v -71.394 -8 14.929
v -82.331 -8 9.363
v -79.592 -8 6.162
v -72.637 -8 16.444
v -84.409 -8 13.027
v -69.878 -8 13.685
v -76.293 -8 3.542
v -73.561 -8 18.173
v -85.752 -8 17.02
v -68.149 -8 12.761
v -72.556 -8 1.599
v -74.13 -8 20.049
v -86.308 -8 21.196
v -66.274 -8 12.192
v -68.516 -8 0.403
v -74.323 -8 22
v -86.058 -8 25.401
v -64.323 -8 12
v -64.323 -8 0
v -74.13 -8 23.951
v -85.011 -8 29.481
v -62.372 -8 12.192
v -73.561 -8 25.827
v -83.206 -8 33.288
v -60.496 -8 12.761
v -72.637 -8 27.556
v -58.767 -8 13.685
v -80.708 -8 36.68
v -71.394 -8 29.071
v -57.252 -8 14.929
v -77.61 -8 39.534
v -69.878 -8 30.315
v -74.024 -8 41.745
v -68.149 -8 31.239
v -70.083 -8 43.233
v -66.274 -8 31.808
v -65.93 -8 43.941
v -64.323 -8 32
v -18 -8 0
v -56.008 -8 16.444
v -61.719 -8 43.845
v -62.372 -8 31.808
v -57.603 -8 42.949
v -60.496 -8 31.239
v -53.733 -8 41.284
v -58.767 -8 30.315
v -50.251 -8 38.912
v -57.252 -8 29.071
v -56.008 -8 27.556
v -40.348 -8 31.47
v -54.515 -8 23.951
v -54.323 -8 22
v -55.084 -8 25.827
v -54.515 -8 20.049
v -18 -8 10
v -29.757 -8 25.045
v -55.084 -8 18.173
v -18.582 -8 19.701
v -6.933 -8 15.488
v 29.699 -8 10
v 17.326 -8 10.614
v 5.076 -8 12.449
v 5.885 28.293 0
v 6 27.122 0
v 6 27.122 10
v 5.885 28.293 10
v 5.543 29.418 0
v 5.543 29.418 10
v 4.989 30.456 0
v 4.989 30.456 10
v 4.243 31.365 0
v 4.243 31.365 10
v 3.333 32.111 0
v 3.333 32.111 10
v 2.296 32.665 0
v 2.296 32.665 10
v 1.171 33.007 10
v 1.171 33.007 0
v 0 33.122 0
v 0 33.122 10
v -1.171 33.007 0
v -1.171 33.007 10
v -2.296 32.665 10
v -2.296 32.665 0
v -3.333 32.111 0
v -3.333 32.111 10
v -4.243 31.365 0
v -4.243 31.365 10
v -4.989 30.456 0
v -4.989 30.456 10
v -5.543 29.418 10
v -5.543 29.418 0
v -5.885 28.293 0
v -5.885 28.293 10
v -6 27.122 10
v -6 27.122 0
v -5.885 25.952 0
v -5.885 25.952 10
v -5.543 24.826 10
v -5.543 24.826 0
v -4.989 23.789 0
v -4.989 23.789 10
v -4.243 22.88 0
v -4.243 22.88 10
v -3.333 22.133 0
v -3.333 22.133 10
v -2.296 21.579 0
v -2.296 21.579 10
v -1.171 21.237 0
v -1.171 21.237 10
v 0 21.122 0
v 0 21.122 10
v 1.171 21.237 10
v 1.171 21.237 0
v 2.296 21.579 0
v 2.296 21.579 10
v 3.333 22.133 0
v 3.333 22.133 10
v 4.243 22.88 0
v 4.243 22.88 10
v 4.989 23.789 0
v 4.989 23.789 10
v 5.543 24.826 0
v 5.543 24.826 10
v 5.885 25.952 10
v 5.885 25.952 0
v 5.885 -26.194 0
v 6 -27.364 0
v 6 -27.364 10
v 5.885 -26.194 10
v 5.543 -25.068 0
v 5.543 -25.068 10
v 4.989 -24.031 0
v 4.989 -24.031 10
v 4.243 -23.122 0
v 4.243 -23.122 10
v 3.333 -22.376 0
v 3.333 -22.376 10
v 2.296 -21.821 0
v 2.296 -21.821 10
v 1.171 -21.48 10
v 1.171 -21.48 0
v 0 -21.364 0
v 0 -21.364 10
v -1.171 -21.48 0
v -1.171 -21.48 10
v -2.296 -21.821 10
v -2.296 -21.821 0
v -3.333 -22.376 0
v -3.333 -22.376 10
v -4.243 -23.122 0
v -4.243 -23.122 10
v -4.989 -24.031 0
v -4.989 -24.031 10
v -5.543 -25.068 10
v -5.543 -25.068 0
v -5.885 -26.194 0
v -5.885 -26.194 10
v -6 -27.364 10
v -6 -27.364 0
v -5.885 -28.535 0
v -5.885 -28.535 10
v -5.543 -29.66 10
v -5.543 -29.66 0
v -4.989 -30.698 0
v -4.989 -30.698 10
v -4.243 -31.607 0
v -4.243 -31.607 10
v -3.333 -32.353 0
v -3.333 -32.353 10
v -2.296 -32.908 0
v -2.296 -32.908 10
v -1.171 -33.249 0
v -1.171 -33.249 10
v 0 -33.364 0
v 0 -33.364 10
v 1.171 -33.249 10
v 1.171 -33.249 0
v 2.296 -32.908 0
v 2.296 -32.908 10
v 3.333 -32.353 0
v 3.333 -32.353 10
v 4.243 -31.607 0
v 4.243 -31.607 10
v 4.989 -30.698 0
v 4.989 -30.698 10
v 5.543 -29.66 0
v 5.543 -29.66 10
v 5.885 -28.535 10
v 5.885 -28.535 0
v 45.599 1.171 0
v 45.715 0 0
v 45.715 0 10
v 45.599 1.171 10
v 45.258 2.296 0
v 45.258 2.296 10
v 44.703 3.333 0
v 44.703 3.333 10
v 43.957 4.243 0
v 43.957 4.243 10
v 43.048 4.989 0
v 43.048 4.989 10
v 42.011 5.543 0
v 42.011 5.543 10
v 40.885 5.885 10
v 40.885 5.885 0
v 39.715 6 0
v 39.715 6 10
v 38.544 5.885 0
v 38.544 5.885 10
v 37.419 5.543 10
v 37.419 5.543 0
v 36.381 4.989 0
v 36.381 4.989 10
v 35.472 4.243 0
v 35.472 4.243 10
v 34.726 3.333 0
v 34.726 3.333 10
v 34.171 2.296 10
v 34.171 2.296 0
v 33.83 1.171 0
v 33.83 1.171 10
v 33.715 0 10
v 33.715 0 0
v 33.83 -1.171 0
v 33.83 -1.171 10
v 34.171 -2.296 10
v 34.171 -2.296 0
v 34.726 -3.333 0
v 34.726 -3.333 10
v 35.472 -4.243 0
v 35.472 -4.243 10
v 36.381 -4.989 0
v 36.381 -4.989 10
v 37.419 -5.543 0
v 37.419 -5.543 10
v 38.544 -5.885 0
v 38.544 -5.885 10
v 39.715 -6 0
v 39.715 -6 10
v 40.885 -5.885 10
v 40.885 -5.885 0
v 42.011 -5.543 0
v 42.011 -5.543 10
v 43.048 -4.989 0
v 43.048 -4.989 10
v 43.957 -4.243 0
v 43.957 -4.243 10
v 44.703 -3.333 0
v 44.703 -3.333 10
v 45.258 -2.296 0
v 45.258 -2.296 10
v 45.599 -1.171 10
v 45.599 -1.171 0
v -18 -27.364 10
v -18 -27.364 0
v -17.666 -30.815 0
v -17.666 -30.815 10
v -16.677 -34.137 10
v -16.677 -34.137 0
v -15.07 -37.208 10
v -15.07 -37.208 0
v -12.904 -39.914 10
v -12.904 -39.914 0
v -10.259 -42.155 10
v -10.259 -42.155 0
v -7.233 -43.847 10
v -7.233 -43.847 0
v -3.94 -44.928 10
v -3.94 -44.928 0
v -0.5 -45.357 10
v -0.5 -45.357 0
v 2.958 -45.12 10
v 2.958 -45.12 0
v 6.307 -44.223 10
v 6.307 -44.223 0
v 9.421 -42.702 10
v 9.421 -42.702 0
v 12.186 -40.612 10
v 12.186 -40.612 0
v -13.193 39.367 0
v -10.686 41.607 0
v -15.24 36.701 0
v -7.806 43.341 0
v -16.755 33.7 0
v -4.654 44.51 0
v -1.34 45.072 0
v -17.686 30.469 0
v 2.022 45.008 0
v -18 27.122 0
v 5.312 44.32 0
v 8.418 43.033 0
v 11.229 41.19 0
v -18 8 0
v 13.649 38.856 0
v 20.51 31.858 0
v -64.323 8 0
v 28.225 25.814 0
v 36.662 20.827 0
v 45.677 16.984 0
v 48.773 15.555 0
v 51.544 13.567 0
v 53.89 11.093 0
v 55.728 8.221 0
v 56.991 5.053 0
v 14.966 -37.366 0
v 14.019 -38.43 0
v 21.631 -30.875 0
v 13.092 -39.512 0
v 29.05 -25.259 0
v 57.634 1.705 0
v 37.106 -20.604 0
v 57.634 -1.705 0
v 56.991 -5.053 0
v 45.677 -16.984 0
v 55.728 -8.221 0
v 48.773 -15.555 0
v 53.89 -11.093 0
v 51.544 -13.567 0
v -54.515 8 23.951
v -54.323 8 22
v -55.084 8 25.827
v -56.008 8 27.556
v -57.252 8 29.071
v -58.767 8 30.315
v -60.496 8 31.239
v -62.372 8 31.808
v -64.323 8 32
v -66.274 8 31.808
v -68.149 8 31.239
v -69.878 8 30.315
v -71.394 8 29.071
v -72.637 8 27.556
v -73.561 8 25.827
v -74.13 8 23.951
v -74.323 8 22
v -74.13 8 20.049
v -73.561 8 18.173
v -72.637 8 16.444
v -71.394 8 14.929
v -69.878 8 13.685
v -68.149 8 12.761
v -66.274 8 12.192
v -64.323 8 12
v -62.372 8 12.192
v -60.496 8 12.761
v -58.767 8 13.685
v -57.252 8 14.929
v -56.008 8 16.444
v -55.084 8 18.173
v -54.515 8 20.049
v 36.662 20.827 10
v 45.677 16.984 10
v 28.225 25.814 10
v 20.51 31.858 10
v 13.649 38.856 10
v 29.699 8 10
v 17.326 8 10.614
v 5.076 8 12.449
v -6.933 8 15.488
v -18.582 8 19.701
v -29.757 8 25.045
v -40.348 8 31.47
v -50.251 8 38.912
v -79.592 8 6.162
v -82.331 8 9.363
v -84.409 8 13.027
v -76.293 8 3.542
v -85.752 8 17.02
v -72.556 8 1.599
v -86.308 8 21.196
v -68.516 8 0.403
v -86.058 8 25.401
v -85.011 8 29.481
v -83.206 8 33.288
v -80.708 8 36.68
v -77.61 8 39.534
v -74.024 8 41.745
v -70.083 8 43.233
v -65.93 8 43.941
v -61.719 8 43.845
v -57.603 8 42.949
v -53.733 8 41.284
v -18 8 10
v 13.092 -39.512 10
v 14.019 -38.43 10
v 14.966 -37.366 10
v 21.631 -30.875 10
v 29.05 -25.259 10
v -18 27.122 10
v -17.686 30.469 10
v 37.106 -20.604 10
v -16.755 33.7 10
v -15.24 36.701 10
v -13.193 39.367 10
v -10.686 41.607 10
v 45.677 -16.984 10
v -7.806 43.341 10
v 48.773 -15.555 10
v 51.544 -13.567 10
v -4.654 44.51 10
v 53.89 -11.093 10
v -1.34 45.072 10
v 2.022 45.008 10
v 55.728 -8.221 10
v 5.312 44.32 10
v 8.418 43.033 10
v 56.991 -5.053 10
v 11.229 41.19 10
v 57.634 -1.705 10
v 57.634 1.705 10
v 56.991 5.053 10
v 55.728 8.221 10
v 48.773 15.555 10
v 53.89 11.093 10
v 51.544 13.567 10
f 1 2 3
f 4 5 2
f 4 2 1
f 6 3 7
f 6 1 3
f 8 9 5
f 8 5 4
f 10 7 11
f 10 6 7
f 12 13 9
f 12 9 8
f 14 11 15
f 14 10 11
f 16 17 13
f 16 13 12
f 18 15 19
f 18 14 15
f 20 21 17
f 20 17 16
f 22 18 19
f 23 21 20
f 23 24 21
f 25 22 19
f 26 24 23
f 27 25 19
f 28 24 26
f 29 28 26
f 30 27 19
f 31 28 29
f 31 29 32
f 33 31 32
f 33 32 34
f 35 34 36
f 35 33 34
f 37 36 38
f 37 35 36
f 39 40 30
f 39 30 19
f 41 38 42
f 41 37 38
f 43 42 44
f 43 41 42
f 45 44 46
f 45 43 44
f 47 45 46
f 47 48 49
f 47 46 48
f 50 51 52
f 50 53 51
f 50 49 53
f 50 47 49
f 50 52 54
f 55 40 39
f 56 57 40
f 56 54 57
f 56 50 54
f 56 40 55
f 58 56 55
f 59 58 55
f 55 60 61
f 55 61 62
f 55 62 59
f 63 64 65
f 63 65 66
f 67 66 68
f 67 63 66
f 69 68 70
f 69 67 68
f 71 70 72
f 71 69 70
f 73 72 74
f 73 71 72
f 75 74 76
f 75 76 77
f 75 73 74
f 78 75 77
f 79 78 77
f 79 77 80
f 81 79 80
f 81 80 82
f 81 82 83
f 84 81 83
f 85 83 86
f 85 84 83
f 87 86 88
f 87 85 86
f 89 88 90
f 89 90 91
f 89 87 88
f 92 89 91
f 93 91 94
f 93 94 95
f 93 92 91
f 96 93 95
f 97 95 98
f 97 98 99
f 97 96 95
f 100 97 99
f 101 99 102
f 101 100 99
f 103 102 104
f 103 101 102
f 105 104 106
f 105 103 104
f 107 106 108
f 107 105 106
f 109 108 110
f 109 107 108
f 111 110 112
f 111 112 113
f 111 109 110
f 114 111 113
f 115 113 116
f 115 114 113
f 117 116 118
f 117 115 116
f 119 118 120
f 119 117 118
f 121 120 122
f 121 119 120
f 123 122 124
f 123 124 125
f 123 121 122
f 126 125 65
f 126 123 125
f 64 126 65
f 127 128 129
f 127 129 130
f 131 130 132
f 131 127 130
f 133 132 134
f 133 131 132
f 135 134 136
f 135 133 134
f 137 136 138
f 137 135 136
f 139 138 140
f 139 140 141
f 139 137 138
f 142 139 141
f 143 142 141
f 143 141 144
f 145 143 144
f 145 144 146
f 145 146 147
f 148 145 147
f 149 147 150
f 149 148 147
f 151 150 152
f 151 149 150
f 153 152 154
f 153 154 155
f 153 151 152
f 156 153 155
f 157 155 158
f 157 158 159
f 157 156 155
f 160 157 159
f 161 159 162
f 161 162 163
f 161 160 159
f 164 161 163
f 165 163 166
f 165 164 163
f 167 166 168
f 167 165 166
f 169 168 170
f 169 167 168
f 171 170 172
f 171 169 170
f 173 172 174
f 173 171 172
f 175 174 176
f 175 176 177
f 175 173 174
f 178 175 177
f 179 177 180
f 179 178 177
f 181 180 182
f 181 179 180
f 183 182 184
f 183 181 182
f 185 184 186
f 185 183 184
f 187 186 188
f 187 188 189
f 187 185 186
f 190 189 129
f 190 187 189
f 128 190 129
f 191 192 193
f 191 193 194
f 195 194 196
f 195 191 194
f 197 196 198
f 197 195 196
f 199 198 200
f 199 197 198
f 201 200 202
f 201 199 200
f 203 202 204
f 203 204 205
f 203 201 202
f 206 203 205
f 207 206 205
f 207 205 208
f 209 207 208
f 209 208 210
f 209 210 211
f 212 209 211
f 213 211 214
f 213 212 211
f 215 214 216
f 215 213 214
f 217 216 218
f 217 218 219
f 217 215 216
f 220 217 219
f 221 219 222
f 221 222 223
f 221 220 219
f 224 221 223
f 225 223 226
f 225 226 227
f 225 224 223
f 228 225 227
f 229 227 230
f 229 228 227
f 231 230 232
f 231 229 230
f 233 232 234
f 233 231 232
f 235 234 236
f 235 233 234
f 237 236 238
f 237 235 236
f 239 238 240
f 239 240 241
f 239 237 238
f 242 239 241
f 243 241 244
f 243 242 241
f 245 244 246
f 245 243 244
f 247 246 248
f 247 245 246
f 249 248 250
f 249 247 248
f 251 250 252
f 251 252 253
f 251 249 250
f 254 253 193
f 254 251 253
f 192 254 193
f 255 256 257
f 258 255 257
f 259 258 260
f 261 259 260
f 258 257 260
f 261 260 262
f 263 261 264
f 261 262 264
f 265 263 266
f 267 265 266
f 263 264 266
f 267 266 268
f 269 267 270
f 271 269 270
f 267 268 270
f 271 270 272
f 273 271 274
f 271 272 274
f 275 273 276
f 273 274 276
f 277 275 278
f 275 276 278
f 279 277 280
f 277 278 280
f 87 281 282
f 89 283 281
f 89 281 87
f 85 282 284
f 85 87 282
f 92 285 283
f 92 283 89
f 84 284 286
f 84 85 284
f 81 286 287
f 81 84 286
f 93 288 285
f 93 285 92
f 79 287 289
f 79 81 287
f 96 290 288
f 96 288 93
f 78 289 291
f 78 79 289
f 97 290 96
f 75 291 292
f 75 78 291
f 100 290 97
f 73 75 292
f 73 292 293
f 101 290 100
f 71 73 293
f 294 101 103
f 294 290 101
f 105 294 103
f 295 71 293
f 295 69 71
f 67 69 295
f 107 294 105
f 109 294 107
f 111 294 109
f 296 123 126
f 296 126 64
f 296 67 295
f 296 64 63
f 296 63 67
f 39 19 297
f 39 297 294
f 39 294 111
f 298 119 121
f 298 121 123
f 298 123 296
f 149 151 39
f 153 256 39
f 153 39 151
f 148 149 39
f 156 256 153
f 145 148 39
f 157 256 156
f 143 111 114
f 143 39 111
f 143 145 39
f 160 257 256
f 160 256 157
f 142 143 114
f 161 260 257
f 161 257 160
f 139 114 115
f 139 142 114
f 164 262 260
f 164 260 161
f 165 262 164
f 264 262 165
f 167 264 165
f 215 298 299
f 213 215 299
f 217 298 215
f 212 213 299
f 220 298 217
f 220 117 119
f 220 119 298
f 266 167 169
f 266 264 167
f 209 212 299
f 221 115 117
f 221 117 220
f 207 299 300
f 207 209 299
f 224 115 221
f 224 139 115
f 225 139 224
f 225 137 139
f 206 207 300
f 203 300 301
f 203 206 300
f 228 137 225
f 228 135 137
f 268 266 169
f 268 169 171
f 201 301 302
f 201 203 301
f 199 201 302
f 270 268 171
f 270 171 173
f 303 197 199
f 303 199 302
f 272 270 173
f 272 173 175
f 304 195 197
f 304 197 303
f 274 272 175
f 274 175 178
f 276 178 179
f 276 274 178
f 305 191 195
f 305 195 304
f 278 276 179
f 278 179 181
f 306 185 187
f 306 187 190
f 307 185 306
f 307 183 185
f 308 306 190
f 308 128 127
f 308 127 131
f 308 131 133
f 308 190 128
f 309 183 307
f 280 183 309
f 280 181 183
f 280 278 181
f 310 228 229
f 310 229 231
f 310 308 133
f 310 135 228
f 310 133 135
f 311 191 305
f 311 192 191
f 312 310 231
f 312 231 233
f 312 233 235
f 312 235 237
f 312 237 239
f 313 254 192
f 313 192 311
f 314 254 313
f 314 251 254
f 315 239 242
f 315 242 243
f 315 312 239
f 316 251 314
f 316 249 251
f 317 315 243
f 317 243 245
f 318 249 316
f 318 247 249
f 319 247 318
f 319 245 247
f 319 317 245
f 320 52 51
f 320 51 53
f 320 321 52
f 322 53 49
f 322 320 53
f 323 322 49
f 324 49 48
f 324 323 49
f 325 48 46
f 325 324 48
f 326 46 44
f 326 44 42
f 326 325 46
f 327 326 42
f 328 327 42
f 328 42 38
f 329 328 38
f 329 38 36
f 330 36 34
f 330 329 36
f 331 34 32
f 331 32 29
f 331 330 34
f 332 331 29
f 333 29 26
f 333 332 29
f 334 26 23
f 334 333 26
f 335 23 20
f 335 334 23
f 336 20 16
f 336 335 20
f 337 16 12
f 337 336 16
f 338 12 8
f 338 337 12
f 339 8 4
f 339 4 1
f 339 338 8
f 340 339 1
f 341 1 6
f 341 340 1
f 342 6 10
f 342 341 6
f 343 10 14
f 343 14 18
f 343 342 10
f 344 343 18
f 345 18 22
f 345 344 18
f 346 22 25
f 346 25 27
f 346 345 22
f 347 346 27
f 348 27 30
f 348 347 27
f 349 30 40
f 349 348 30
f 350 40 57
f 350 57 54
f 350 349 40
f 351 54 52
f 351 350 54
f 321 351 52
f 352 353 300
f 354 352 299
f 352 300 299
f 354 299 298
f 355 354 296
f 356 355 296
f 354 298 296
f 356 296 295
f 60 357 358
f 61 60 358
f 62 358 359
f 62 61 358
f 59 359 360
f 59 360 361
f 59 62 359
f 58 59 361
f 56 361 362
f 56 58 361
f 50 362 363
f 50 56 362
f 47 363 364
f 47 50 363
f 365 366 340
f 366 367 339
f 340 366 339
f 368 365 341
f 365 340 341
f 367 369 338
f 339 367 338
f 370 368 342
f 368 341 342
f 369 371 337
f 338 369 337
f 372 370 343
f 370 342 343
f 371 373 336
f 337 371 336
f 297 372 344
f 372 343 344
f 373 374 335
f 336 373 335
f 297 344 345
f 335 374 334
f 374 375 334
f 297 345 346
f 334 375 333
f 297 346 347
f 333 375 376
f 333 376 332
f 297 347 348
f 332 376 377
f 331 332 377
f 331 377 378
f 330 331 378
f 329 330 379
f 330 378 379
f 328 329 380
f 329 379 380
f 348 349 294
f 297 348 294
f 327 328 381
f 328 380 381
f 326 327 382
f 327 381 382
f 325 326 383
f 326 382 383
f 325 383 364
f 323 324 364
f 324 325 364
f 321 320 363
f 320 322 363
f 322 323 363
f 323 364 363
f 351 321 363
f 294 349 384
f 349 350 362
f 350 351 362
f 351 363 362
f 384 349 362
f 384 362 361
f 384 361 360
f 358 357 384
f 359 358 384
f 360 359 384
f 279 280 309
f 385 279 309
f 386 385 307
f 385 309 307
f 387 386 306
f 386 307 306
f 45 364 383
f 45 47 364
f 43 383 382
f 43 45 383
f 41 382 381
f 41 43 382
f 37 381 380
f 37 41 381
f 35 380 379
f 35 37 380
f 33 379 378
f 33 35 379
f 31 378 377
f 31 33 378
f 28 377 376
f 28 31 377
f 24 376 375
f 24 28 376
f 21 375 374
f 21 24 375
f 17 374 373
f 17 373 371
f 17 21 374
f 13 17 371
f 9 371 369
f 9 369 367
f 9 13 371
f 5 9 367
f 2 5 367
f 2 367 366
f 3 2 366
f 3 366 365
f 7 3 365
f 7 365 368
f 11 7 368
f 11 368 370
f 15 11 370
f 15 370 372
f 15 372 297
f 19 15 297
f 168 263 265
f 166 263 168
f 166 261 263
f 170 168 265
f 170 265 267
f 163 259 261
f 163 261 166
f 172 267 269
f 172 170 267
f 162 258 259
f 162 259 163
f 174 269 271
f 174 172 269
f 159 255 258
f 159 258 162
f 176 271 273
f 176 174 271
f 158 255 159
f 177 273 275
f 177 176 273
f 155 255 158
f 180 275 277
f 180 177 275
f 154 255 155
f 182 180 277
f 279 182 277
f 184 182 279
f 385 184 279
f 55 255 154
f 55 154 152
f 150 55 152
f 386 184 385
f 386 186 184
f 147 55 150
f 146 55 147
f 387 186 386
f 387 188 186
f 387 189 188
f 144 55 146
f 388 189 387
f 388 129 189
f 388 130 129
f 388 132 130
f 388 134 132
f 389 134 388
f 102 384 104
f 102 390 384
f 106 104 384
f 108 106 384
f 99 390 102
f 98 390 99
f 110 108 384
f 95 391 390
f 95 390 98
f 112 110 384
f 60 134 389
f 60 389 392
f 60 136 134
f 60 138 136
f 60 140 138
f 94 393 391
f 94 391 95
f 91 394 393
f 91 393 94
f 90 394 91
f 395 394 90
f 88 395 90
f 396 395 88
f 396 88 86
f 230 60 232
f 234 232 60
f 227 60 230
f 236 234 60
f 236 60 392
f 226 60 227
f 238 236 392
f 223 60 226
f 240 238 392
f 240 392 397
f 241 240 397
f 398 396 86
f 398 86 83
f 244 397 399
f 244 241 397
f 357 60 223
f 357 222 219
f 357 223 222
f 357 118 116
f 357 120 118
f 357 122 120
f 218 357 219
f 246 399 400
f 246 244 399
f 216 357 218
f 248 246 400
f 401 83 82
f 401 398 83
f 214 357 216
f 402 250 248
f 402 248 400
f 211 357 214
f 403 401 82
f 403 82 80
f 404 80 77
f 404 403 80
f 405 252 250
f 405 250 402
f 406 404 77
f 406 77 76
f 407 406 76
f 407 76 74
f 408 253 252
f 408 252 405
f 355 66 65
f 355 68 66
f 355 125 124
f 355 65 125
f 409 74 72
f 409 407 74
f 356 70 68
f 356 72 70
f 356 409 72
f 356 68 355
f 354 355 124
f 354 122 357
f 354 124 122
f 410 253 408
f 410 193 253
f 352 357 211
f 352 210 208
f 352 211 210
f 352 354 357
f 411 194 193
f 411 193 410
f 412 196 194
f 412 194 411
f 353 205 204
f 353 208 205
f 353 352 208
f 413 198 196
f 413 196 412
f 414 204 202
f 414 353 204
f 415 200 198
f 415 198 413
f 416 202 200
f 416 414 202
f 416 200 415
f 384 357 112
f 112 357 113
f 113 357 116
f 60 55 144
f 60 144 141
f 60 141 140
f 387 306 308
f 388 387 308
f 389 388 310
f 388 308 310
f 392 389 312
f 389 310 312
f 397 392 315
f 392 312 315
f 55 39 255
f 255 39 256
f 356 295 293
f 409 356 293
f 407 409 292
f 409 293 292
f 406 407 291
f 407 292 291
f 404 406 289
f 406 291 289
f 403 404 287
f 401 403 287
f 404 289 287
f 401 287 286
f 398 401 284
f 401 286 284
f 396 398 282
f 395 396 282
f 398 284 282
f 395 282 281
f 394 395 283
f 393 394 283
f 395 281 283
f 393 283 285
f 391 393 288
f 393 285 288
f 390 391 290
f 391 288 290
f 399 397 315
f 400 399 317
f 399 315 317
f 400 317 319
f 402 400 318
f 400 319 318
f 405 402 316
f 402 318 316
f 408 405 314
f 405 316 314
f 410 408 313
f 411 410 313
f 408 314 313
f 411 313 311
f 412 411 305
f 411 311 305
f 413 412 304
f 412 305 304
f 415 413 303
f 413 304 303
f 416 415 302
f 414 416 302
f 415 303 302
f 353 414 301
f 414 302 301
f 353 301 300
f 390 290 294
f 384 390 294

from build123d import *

# Parameters (mm, degrees)
F0_R     = 6
F1_DEPTH = 10
F2_R     = 10
F3_DEPTH = 8


with BuildPart() as f1:
    # F0 (on Top) → F1 (new body)
    with BuildSketch(Plane.XY):
        with BuildLine():
            ThreePointArc((45.67737, 16.983681), (28.225108, 25.813944), (13.649464, 38.856397))
            ThreePointArc((13.649464, 38.856397), (-6.257381, 43.999525), (-18, 27.122168))
            Line((-18, 27.122168), (-18, -27.364329))
            ThreePointArc((-18, -27.364329), (-7.233419, -43.846975), (12.186406, -40.61165))
            ThreePointArc((12.186406, -40.61165), (13.552871, -38.96898), (14.965577, -37.365903))
            ThreePointArc((14.965577, -37.365903), (29.049835, -25.258696), (45.67737, -16.983681))
            ThreePointArc((45.67737, -16.983681), (57.714603, 0), (45.67737, 16.983681))
        make_face()
        with Locations((0, -27.364329)):
            Circle(F0_R, mode=Mode.SUBTRACT)
        with Locations((0, 27.122168)):
            Circle(F0_R, mode=Mode.SUBTRACT)
        with Locations((39.714603, 0)):
            Circle(F0_R, mode=Mode.SUBTRACT)
    extrude(amount=F1_DEPTH)

    # F2 (on Front) → F3 (join, symmetric)
    with BuildSketch(Plane.XZ):
        with BuildLine():
            Line((-64.32263, 0), (0, 0))
            Line((0, 0), (29.698644, 0))
            Line((29.698644, 0), (29.698644, 10))
            ThreePointArc((29.698644, 10), (-12.809858, 17.449895), (-50.251419, 38.911565))
            ThreePointArc((-50.251419, 38.911565), (-85.011449, 29.481496), (-64.32263, 0))
        make_face()
        with Locations((-64.32263, 22)):
            Circle(F2_R, mode=Mode.SUBTRACT)
    extrude(amount=F3_DEPTH, both=True)


solid = f1.part
